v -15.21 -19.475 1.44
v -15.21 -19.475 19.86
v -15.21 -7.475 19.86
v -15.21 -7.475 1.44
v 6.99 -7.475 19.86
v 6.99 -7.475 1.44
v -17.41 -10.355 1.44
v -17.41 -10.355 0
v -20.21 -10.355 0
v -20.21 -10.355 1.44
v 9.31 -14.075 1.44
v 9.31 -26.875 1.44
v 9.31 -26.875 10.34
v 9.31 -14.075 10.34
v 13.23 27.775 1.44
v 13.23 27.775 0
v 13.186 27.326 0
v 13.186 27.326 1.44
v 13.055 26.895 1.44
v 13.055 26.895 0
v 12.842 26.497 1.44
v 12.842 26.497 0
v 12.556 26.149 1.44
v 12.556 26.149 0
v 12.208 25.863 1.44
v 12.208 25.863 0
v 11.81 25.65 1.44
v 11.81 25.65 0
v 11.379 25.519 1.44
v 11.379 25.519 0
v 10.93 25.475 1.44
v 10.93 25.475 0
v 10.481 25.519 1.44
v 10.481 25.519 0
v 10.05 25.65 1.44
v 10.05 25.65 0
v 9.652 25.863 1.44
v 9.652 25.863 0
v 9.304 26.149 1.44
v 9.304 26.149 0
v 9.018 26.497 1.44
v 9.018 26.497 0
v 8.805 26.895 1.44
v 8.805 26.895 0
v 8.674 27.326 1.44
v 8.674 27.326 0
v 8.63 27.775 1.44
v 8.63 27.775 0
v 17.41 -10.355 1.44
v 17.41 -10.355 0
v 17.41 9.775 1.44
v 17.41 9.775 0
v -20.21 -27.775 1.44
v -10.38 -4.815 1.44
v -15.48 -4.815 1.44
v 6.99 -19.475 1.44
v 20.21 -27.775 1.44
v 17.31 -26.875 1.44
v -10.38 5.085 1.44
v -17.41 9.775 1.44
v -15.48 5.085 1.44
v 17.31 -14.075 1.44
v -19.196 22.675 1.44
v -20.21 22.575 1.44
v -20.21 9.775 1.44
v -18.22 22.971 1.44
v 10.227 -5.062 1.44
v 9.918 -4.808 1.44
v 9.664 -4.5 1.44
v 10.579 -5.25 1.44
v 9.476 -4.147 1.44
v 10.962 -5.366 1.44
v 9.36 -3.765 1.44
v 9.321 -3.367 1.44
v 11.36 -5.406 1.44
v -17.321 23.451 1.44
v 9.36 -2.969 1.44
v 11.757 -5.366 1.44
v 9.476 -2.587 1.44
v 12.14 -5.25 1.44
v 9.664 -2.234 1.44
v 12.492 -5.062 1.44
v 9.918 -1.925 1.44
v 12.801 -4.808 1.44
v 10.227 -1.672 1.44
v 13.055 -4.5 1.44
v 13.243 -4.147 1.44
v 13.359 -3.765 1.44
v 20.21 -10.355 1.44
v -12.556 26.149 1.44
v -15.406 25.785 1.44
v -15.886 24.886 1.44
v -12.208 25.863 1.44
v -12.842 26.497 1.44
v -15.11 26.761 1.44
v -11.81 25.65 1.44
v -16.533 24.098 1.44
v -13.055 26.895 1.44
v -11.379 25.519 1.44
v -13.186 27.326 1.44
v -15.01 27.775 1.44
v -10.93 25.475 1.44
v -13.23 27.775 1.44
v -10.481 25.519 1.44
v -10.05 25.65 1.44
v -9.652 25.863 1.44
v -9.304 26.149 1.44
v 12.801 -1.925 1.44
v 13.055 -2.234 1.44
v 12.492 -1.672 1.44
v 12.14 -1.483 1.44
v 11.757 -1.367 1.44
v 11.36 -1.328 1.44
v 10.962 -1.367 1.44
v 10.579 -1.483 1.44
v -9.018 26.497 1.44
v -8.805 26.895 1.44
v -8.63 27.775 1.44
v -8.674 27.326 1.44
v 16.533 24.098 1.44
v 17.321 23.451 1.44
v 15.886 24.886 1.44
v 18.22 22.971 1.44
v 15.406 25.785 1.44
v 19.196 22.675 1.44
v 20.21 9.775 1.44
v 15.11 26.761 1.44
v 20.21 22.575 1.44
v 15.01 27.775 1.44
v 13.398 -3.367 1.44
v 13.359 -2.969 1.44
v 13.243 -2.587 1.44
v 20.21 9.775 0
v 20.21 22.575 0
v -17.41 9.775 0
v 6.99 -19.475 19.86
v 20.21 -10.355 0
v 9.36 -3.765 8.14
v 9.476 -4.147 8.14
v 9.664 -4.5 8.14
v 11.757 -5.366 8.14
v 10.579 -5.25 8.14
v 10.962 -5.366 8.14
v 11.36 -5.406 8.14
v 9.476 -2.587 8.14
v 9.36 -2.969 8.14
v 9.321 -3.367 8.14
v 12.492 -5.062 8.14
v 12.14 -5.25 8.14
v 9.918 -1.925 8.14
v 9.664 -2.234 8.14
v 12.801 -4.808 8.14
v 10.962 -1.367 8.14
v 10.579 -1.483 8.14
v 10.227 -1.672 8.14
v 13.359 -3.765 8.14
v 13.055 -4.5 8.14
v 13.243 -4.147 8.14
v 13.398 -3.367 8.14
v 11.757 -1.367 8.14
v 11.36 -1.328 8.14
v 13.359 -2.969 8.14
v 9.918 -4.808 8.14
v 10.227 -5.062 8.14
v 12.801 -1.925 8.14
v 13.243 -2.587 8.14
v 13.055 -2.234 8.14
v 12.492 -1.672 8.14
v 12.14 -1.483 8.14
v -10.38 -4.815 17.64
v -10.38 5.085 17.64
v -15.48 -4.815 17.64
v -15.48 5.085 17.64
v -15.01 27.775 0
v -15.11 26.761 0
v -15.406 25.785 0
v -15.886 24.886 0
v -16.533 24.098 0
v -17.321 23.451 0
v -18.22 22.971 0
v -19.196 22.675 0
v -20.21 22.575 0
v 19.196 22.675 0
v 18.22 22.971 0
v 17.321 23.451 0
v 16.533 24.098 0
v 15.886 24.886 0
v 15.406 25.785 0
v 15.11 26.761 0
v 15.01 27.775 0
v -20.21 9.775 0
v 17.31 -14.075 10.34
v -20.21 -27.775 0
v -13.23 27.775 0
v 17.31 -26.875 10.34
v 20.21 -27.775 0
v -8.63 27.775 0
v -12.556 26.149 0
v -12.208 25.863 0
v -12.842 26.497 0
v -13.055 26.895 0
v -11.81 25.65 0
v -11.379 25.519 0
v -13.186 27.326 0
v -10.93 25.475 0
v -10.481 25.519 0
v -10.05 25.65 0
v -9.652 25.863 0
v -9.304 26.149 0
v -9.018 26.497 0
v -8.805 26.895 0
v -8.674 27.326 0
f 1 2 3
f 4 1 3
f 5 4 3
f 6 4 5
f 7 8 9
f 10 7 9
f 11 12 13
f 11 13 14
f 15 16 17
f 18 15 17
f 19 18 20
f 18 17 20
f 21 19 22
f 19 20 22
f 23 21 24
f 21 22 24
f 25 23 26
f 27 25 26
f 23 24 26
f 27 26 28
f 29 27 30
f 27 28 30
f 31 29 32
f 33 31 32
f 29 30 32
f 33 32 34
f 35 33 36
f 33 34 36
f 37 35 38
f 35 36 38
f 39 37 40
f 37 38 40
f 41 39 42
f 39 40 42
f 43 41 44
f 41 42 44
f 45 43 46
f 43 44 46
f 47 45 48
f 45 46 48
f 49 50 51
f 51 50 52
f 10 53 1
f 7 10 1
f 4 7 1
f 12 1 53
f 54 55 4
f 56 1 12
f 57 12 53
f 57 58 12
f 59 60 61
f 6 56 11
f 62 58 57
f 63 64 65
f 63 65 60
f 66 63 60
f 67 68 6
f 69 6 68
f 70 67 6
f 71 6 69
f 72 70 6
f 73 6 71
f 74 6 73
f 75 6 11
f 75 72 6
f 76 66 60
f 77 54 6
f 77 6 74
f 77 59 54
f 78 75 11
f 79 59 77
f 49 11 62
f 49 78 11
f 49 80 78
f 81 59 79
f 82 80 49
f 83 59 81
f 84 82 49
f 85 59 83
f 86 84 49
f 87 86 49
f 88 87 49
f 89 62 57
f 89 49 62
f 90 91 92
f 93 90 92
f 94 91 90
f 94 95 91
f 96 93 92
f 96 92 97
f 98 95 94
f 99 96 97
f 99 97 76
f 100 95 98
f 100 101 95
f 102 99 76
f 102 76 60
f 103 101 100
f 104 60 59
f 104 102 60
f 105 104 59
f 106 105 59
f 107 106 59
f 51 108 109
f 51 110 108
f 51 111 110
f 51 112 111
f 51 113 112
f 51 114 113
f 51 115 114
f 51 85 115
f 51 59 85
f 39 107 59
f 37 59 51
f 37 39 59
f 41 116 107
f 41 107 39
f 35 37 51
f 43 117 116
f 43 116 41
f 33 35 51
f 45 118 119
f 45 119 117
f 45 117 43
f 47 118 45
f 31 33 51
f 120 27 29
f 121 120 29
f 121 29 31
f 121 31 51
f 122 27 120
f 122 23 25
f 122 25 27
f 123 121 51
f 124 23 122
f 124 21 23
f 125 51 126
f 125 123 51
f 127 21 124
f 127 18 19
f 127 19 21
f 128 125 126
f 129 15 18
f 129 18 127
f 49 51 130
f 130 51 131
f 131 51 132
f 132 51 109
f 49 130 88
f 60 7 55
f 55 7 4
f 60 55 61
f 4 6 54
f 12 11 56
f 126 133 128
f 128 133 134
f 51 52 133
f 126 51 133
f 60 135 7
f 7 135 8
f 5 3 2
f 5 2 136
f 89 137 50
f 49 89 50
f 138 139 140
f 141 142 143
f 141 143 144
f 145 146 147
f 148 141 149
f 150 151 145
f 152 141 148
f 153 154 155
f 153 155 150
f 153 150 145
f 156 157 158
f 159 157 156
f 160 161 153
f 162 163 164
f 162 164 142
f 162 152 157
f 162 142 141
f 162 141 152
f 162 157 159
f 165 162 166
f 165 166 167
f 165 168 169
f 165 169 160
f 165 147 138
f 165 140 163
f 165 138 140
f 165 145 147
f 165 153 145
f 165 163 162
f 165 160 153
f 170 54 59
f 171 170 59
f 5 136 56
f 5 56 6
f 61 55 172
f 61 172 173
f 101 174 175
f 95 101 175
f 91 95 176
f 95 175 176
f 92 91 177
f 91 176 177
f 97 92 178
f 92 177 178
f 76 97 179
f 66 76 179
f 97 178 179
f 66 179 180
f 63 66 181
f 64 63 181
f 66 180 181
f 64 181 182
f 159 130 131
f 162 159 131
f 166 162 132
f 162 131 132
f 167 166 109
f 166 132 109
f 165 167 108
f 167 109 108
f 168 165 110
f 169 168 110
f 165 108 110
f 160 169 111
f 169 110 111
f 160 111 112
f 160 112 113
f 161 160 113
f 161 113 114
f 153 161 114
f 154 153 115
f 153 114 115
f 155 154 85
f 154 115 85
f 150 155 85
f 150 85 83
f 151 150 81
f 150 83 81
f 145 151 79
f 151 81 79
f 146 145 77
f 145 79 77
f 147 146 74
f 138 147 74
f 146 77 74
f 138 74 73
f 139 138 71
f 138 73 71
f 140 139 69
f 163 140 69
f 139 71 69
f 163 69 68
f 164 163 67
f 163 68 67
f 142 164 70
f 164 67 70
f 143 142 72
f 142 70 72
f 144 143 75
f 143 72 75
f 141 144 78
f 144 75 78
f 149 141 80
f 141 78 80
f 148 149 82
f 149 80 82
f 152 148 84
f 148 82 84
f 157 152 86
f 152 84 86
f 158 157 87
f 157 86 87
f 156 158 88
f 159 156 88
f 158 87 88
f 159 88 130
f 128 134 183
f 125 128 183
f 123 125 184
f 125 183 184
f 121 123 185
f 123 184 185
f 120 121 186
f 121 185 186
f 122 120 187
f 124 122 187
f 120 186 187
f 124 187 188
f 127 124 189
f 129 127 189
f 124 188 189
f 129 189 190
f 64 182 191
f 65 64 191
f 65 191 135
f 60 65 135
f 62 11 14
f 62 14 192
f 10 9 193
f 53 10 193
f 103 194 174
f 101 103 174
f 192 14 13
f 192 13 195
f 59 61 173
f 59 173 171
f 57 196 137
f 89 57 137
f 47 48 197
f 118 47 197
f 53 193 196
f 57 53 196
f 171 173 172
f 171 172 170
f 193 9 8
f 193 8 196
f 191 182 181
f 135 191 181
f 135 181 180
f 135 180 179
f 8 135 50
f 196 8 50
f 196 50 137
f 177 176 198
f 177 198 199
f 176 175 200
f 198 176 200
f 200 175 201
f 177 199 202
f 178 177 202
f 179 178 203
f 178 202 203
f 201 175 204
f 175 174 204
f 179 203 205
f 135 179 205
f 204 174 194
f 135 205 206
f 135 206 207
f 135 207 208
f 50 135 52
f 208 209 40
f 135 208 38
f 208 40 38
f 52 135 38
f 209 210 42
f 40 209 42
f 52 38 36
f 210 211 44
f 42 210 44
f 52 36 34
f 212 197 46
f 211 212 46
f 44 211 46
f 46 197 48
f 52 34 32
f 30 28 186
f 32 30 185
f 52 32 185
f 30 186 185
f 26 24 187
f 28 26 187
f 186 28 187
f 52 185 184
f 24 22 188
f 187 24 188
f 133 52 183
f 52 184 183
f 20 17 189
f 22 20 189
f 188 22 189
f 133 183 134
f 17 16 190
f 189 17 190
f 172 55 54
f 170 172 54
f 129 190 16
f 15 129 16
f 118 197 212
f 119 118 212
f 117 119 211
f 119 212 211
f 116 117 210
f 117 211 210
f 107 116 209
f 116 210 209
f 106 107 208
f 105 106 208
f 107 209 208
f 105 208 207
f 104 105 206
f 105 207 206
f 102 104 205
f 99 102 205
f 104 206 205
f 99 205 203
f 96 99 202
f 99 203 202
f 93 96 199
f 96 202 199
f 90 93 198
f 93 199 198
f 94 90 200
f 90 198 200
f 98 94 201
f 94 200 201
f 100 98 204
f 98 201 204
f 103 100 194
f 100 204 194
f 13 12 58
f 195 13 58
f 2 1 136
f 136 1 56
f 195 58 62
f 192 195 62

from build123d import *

# Parameters (mm, degrees)
F1_DEPTH = 1.44
F2_W     = 22.2
F2_H     = 12
F3_DEPTH = 18.42
F2_W_2   = 5.1
F2_H_2   = 9.9
F4_DEPTH = 16.2
F2_W_3   = 8
F2_H_3   = 12.8
F5_DEPTH = 8.9
F2_R     = 2.038774
F6_DEPTH = 6.7


with BuildPart() as f1:
    # F0 (on Top) → F1 (new body)
    with BuildSketch(Plane.XY):
        with BuildLine():
            Line((-20.21, -27.775), (20.21, -27.775))
            Line((20.21, -27.775), (20.21, -10.355))
            Line((20.21, -10.355), (17.41, -10.355))
            Line((17.41, -10.355), (17.41, 9.775))
            Line((17.41, 9.775), (20.21, 9.775))
            Line((20.21, 9.775), (20.21, 22.575))
            ThreePointArc((20.21, 22.575), (16.533045, 24.098045), (15.01, 27.775))
            Line((15.01, 27.775), (13.23, 27.775))
            ThreePointArc((13.23, 27.775), (10.93, 25.475), (8.63, 27.775))
            Line((8.63, 27.775), (-8.63, 27.775))
            ThreePointArc((-8.63, 27.775), (-10.93, 25.475), (-13.23, 27.775))
            Line((-13.23, 27.775), (-15.01, 27.775))
            ThreePointArc((-15.01, 27.775), (-16.533045, 24.098045), (-20.21, 22.575))
            Line((-20.21, 22.575), (-20.21, 9.775))
            Line((-20.21, 9.775), (-17.41, 9.775))
            Line((-17.41, 9.775), (-17.41, -10.355))
            Line((-17.41, -10.355), (-20.21, -10.355))
            Line((-20.21, -10.355), (-20.21, -27.775))
        make_face()
    extrude(amount=F1_DEPTH)

    # F2 (on face) → F3 (join)
    with BuildSketch(Plane.XY.offset(1.44)):
        with Locations((-4.11, -13.475)):
            Rectangle(F2_W, F2_H)
    extrude(amount=F3_DEPTH)

    # F2 (on face) → F4 (join)
    with BuildSketch(Plane.XY.offset(1.44)):
        with Locations((-12.93, 0.135)):
            Rectangle(F2_W_2, F2_H_2)
    extrude(amount=F4_DEPTH)

    # F2 (on face) → F5 (join)
    with BuildSketch(Plane.XY.offset(1.44)):
        with Locations((13.31, -20.475)):
            Rectangle(F2_W_3, F2_H_3)
    extrude(amount=F5_DEPTH)

    # F2 (on face) → F6 (join)
    with BuildSketch(Plane.XY.offset(1.44)):
        with Locations((11.359598, -3.366856)):
            Circle(F2_R)
    extrude(amount=F6_DEPTH)


solid = f1.part
